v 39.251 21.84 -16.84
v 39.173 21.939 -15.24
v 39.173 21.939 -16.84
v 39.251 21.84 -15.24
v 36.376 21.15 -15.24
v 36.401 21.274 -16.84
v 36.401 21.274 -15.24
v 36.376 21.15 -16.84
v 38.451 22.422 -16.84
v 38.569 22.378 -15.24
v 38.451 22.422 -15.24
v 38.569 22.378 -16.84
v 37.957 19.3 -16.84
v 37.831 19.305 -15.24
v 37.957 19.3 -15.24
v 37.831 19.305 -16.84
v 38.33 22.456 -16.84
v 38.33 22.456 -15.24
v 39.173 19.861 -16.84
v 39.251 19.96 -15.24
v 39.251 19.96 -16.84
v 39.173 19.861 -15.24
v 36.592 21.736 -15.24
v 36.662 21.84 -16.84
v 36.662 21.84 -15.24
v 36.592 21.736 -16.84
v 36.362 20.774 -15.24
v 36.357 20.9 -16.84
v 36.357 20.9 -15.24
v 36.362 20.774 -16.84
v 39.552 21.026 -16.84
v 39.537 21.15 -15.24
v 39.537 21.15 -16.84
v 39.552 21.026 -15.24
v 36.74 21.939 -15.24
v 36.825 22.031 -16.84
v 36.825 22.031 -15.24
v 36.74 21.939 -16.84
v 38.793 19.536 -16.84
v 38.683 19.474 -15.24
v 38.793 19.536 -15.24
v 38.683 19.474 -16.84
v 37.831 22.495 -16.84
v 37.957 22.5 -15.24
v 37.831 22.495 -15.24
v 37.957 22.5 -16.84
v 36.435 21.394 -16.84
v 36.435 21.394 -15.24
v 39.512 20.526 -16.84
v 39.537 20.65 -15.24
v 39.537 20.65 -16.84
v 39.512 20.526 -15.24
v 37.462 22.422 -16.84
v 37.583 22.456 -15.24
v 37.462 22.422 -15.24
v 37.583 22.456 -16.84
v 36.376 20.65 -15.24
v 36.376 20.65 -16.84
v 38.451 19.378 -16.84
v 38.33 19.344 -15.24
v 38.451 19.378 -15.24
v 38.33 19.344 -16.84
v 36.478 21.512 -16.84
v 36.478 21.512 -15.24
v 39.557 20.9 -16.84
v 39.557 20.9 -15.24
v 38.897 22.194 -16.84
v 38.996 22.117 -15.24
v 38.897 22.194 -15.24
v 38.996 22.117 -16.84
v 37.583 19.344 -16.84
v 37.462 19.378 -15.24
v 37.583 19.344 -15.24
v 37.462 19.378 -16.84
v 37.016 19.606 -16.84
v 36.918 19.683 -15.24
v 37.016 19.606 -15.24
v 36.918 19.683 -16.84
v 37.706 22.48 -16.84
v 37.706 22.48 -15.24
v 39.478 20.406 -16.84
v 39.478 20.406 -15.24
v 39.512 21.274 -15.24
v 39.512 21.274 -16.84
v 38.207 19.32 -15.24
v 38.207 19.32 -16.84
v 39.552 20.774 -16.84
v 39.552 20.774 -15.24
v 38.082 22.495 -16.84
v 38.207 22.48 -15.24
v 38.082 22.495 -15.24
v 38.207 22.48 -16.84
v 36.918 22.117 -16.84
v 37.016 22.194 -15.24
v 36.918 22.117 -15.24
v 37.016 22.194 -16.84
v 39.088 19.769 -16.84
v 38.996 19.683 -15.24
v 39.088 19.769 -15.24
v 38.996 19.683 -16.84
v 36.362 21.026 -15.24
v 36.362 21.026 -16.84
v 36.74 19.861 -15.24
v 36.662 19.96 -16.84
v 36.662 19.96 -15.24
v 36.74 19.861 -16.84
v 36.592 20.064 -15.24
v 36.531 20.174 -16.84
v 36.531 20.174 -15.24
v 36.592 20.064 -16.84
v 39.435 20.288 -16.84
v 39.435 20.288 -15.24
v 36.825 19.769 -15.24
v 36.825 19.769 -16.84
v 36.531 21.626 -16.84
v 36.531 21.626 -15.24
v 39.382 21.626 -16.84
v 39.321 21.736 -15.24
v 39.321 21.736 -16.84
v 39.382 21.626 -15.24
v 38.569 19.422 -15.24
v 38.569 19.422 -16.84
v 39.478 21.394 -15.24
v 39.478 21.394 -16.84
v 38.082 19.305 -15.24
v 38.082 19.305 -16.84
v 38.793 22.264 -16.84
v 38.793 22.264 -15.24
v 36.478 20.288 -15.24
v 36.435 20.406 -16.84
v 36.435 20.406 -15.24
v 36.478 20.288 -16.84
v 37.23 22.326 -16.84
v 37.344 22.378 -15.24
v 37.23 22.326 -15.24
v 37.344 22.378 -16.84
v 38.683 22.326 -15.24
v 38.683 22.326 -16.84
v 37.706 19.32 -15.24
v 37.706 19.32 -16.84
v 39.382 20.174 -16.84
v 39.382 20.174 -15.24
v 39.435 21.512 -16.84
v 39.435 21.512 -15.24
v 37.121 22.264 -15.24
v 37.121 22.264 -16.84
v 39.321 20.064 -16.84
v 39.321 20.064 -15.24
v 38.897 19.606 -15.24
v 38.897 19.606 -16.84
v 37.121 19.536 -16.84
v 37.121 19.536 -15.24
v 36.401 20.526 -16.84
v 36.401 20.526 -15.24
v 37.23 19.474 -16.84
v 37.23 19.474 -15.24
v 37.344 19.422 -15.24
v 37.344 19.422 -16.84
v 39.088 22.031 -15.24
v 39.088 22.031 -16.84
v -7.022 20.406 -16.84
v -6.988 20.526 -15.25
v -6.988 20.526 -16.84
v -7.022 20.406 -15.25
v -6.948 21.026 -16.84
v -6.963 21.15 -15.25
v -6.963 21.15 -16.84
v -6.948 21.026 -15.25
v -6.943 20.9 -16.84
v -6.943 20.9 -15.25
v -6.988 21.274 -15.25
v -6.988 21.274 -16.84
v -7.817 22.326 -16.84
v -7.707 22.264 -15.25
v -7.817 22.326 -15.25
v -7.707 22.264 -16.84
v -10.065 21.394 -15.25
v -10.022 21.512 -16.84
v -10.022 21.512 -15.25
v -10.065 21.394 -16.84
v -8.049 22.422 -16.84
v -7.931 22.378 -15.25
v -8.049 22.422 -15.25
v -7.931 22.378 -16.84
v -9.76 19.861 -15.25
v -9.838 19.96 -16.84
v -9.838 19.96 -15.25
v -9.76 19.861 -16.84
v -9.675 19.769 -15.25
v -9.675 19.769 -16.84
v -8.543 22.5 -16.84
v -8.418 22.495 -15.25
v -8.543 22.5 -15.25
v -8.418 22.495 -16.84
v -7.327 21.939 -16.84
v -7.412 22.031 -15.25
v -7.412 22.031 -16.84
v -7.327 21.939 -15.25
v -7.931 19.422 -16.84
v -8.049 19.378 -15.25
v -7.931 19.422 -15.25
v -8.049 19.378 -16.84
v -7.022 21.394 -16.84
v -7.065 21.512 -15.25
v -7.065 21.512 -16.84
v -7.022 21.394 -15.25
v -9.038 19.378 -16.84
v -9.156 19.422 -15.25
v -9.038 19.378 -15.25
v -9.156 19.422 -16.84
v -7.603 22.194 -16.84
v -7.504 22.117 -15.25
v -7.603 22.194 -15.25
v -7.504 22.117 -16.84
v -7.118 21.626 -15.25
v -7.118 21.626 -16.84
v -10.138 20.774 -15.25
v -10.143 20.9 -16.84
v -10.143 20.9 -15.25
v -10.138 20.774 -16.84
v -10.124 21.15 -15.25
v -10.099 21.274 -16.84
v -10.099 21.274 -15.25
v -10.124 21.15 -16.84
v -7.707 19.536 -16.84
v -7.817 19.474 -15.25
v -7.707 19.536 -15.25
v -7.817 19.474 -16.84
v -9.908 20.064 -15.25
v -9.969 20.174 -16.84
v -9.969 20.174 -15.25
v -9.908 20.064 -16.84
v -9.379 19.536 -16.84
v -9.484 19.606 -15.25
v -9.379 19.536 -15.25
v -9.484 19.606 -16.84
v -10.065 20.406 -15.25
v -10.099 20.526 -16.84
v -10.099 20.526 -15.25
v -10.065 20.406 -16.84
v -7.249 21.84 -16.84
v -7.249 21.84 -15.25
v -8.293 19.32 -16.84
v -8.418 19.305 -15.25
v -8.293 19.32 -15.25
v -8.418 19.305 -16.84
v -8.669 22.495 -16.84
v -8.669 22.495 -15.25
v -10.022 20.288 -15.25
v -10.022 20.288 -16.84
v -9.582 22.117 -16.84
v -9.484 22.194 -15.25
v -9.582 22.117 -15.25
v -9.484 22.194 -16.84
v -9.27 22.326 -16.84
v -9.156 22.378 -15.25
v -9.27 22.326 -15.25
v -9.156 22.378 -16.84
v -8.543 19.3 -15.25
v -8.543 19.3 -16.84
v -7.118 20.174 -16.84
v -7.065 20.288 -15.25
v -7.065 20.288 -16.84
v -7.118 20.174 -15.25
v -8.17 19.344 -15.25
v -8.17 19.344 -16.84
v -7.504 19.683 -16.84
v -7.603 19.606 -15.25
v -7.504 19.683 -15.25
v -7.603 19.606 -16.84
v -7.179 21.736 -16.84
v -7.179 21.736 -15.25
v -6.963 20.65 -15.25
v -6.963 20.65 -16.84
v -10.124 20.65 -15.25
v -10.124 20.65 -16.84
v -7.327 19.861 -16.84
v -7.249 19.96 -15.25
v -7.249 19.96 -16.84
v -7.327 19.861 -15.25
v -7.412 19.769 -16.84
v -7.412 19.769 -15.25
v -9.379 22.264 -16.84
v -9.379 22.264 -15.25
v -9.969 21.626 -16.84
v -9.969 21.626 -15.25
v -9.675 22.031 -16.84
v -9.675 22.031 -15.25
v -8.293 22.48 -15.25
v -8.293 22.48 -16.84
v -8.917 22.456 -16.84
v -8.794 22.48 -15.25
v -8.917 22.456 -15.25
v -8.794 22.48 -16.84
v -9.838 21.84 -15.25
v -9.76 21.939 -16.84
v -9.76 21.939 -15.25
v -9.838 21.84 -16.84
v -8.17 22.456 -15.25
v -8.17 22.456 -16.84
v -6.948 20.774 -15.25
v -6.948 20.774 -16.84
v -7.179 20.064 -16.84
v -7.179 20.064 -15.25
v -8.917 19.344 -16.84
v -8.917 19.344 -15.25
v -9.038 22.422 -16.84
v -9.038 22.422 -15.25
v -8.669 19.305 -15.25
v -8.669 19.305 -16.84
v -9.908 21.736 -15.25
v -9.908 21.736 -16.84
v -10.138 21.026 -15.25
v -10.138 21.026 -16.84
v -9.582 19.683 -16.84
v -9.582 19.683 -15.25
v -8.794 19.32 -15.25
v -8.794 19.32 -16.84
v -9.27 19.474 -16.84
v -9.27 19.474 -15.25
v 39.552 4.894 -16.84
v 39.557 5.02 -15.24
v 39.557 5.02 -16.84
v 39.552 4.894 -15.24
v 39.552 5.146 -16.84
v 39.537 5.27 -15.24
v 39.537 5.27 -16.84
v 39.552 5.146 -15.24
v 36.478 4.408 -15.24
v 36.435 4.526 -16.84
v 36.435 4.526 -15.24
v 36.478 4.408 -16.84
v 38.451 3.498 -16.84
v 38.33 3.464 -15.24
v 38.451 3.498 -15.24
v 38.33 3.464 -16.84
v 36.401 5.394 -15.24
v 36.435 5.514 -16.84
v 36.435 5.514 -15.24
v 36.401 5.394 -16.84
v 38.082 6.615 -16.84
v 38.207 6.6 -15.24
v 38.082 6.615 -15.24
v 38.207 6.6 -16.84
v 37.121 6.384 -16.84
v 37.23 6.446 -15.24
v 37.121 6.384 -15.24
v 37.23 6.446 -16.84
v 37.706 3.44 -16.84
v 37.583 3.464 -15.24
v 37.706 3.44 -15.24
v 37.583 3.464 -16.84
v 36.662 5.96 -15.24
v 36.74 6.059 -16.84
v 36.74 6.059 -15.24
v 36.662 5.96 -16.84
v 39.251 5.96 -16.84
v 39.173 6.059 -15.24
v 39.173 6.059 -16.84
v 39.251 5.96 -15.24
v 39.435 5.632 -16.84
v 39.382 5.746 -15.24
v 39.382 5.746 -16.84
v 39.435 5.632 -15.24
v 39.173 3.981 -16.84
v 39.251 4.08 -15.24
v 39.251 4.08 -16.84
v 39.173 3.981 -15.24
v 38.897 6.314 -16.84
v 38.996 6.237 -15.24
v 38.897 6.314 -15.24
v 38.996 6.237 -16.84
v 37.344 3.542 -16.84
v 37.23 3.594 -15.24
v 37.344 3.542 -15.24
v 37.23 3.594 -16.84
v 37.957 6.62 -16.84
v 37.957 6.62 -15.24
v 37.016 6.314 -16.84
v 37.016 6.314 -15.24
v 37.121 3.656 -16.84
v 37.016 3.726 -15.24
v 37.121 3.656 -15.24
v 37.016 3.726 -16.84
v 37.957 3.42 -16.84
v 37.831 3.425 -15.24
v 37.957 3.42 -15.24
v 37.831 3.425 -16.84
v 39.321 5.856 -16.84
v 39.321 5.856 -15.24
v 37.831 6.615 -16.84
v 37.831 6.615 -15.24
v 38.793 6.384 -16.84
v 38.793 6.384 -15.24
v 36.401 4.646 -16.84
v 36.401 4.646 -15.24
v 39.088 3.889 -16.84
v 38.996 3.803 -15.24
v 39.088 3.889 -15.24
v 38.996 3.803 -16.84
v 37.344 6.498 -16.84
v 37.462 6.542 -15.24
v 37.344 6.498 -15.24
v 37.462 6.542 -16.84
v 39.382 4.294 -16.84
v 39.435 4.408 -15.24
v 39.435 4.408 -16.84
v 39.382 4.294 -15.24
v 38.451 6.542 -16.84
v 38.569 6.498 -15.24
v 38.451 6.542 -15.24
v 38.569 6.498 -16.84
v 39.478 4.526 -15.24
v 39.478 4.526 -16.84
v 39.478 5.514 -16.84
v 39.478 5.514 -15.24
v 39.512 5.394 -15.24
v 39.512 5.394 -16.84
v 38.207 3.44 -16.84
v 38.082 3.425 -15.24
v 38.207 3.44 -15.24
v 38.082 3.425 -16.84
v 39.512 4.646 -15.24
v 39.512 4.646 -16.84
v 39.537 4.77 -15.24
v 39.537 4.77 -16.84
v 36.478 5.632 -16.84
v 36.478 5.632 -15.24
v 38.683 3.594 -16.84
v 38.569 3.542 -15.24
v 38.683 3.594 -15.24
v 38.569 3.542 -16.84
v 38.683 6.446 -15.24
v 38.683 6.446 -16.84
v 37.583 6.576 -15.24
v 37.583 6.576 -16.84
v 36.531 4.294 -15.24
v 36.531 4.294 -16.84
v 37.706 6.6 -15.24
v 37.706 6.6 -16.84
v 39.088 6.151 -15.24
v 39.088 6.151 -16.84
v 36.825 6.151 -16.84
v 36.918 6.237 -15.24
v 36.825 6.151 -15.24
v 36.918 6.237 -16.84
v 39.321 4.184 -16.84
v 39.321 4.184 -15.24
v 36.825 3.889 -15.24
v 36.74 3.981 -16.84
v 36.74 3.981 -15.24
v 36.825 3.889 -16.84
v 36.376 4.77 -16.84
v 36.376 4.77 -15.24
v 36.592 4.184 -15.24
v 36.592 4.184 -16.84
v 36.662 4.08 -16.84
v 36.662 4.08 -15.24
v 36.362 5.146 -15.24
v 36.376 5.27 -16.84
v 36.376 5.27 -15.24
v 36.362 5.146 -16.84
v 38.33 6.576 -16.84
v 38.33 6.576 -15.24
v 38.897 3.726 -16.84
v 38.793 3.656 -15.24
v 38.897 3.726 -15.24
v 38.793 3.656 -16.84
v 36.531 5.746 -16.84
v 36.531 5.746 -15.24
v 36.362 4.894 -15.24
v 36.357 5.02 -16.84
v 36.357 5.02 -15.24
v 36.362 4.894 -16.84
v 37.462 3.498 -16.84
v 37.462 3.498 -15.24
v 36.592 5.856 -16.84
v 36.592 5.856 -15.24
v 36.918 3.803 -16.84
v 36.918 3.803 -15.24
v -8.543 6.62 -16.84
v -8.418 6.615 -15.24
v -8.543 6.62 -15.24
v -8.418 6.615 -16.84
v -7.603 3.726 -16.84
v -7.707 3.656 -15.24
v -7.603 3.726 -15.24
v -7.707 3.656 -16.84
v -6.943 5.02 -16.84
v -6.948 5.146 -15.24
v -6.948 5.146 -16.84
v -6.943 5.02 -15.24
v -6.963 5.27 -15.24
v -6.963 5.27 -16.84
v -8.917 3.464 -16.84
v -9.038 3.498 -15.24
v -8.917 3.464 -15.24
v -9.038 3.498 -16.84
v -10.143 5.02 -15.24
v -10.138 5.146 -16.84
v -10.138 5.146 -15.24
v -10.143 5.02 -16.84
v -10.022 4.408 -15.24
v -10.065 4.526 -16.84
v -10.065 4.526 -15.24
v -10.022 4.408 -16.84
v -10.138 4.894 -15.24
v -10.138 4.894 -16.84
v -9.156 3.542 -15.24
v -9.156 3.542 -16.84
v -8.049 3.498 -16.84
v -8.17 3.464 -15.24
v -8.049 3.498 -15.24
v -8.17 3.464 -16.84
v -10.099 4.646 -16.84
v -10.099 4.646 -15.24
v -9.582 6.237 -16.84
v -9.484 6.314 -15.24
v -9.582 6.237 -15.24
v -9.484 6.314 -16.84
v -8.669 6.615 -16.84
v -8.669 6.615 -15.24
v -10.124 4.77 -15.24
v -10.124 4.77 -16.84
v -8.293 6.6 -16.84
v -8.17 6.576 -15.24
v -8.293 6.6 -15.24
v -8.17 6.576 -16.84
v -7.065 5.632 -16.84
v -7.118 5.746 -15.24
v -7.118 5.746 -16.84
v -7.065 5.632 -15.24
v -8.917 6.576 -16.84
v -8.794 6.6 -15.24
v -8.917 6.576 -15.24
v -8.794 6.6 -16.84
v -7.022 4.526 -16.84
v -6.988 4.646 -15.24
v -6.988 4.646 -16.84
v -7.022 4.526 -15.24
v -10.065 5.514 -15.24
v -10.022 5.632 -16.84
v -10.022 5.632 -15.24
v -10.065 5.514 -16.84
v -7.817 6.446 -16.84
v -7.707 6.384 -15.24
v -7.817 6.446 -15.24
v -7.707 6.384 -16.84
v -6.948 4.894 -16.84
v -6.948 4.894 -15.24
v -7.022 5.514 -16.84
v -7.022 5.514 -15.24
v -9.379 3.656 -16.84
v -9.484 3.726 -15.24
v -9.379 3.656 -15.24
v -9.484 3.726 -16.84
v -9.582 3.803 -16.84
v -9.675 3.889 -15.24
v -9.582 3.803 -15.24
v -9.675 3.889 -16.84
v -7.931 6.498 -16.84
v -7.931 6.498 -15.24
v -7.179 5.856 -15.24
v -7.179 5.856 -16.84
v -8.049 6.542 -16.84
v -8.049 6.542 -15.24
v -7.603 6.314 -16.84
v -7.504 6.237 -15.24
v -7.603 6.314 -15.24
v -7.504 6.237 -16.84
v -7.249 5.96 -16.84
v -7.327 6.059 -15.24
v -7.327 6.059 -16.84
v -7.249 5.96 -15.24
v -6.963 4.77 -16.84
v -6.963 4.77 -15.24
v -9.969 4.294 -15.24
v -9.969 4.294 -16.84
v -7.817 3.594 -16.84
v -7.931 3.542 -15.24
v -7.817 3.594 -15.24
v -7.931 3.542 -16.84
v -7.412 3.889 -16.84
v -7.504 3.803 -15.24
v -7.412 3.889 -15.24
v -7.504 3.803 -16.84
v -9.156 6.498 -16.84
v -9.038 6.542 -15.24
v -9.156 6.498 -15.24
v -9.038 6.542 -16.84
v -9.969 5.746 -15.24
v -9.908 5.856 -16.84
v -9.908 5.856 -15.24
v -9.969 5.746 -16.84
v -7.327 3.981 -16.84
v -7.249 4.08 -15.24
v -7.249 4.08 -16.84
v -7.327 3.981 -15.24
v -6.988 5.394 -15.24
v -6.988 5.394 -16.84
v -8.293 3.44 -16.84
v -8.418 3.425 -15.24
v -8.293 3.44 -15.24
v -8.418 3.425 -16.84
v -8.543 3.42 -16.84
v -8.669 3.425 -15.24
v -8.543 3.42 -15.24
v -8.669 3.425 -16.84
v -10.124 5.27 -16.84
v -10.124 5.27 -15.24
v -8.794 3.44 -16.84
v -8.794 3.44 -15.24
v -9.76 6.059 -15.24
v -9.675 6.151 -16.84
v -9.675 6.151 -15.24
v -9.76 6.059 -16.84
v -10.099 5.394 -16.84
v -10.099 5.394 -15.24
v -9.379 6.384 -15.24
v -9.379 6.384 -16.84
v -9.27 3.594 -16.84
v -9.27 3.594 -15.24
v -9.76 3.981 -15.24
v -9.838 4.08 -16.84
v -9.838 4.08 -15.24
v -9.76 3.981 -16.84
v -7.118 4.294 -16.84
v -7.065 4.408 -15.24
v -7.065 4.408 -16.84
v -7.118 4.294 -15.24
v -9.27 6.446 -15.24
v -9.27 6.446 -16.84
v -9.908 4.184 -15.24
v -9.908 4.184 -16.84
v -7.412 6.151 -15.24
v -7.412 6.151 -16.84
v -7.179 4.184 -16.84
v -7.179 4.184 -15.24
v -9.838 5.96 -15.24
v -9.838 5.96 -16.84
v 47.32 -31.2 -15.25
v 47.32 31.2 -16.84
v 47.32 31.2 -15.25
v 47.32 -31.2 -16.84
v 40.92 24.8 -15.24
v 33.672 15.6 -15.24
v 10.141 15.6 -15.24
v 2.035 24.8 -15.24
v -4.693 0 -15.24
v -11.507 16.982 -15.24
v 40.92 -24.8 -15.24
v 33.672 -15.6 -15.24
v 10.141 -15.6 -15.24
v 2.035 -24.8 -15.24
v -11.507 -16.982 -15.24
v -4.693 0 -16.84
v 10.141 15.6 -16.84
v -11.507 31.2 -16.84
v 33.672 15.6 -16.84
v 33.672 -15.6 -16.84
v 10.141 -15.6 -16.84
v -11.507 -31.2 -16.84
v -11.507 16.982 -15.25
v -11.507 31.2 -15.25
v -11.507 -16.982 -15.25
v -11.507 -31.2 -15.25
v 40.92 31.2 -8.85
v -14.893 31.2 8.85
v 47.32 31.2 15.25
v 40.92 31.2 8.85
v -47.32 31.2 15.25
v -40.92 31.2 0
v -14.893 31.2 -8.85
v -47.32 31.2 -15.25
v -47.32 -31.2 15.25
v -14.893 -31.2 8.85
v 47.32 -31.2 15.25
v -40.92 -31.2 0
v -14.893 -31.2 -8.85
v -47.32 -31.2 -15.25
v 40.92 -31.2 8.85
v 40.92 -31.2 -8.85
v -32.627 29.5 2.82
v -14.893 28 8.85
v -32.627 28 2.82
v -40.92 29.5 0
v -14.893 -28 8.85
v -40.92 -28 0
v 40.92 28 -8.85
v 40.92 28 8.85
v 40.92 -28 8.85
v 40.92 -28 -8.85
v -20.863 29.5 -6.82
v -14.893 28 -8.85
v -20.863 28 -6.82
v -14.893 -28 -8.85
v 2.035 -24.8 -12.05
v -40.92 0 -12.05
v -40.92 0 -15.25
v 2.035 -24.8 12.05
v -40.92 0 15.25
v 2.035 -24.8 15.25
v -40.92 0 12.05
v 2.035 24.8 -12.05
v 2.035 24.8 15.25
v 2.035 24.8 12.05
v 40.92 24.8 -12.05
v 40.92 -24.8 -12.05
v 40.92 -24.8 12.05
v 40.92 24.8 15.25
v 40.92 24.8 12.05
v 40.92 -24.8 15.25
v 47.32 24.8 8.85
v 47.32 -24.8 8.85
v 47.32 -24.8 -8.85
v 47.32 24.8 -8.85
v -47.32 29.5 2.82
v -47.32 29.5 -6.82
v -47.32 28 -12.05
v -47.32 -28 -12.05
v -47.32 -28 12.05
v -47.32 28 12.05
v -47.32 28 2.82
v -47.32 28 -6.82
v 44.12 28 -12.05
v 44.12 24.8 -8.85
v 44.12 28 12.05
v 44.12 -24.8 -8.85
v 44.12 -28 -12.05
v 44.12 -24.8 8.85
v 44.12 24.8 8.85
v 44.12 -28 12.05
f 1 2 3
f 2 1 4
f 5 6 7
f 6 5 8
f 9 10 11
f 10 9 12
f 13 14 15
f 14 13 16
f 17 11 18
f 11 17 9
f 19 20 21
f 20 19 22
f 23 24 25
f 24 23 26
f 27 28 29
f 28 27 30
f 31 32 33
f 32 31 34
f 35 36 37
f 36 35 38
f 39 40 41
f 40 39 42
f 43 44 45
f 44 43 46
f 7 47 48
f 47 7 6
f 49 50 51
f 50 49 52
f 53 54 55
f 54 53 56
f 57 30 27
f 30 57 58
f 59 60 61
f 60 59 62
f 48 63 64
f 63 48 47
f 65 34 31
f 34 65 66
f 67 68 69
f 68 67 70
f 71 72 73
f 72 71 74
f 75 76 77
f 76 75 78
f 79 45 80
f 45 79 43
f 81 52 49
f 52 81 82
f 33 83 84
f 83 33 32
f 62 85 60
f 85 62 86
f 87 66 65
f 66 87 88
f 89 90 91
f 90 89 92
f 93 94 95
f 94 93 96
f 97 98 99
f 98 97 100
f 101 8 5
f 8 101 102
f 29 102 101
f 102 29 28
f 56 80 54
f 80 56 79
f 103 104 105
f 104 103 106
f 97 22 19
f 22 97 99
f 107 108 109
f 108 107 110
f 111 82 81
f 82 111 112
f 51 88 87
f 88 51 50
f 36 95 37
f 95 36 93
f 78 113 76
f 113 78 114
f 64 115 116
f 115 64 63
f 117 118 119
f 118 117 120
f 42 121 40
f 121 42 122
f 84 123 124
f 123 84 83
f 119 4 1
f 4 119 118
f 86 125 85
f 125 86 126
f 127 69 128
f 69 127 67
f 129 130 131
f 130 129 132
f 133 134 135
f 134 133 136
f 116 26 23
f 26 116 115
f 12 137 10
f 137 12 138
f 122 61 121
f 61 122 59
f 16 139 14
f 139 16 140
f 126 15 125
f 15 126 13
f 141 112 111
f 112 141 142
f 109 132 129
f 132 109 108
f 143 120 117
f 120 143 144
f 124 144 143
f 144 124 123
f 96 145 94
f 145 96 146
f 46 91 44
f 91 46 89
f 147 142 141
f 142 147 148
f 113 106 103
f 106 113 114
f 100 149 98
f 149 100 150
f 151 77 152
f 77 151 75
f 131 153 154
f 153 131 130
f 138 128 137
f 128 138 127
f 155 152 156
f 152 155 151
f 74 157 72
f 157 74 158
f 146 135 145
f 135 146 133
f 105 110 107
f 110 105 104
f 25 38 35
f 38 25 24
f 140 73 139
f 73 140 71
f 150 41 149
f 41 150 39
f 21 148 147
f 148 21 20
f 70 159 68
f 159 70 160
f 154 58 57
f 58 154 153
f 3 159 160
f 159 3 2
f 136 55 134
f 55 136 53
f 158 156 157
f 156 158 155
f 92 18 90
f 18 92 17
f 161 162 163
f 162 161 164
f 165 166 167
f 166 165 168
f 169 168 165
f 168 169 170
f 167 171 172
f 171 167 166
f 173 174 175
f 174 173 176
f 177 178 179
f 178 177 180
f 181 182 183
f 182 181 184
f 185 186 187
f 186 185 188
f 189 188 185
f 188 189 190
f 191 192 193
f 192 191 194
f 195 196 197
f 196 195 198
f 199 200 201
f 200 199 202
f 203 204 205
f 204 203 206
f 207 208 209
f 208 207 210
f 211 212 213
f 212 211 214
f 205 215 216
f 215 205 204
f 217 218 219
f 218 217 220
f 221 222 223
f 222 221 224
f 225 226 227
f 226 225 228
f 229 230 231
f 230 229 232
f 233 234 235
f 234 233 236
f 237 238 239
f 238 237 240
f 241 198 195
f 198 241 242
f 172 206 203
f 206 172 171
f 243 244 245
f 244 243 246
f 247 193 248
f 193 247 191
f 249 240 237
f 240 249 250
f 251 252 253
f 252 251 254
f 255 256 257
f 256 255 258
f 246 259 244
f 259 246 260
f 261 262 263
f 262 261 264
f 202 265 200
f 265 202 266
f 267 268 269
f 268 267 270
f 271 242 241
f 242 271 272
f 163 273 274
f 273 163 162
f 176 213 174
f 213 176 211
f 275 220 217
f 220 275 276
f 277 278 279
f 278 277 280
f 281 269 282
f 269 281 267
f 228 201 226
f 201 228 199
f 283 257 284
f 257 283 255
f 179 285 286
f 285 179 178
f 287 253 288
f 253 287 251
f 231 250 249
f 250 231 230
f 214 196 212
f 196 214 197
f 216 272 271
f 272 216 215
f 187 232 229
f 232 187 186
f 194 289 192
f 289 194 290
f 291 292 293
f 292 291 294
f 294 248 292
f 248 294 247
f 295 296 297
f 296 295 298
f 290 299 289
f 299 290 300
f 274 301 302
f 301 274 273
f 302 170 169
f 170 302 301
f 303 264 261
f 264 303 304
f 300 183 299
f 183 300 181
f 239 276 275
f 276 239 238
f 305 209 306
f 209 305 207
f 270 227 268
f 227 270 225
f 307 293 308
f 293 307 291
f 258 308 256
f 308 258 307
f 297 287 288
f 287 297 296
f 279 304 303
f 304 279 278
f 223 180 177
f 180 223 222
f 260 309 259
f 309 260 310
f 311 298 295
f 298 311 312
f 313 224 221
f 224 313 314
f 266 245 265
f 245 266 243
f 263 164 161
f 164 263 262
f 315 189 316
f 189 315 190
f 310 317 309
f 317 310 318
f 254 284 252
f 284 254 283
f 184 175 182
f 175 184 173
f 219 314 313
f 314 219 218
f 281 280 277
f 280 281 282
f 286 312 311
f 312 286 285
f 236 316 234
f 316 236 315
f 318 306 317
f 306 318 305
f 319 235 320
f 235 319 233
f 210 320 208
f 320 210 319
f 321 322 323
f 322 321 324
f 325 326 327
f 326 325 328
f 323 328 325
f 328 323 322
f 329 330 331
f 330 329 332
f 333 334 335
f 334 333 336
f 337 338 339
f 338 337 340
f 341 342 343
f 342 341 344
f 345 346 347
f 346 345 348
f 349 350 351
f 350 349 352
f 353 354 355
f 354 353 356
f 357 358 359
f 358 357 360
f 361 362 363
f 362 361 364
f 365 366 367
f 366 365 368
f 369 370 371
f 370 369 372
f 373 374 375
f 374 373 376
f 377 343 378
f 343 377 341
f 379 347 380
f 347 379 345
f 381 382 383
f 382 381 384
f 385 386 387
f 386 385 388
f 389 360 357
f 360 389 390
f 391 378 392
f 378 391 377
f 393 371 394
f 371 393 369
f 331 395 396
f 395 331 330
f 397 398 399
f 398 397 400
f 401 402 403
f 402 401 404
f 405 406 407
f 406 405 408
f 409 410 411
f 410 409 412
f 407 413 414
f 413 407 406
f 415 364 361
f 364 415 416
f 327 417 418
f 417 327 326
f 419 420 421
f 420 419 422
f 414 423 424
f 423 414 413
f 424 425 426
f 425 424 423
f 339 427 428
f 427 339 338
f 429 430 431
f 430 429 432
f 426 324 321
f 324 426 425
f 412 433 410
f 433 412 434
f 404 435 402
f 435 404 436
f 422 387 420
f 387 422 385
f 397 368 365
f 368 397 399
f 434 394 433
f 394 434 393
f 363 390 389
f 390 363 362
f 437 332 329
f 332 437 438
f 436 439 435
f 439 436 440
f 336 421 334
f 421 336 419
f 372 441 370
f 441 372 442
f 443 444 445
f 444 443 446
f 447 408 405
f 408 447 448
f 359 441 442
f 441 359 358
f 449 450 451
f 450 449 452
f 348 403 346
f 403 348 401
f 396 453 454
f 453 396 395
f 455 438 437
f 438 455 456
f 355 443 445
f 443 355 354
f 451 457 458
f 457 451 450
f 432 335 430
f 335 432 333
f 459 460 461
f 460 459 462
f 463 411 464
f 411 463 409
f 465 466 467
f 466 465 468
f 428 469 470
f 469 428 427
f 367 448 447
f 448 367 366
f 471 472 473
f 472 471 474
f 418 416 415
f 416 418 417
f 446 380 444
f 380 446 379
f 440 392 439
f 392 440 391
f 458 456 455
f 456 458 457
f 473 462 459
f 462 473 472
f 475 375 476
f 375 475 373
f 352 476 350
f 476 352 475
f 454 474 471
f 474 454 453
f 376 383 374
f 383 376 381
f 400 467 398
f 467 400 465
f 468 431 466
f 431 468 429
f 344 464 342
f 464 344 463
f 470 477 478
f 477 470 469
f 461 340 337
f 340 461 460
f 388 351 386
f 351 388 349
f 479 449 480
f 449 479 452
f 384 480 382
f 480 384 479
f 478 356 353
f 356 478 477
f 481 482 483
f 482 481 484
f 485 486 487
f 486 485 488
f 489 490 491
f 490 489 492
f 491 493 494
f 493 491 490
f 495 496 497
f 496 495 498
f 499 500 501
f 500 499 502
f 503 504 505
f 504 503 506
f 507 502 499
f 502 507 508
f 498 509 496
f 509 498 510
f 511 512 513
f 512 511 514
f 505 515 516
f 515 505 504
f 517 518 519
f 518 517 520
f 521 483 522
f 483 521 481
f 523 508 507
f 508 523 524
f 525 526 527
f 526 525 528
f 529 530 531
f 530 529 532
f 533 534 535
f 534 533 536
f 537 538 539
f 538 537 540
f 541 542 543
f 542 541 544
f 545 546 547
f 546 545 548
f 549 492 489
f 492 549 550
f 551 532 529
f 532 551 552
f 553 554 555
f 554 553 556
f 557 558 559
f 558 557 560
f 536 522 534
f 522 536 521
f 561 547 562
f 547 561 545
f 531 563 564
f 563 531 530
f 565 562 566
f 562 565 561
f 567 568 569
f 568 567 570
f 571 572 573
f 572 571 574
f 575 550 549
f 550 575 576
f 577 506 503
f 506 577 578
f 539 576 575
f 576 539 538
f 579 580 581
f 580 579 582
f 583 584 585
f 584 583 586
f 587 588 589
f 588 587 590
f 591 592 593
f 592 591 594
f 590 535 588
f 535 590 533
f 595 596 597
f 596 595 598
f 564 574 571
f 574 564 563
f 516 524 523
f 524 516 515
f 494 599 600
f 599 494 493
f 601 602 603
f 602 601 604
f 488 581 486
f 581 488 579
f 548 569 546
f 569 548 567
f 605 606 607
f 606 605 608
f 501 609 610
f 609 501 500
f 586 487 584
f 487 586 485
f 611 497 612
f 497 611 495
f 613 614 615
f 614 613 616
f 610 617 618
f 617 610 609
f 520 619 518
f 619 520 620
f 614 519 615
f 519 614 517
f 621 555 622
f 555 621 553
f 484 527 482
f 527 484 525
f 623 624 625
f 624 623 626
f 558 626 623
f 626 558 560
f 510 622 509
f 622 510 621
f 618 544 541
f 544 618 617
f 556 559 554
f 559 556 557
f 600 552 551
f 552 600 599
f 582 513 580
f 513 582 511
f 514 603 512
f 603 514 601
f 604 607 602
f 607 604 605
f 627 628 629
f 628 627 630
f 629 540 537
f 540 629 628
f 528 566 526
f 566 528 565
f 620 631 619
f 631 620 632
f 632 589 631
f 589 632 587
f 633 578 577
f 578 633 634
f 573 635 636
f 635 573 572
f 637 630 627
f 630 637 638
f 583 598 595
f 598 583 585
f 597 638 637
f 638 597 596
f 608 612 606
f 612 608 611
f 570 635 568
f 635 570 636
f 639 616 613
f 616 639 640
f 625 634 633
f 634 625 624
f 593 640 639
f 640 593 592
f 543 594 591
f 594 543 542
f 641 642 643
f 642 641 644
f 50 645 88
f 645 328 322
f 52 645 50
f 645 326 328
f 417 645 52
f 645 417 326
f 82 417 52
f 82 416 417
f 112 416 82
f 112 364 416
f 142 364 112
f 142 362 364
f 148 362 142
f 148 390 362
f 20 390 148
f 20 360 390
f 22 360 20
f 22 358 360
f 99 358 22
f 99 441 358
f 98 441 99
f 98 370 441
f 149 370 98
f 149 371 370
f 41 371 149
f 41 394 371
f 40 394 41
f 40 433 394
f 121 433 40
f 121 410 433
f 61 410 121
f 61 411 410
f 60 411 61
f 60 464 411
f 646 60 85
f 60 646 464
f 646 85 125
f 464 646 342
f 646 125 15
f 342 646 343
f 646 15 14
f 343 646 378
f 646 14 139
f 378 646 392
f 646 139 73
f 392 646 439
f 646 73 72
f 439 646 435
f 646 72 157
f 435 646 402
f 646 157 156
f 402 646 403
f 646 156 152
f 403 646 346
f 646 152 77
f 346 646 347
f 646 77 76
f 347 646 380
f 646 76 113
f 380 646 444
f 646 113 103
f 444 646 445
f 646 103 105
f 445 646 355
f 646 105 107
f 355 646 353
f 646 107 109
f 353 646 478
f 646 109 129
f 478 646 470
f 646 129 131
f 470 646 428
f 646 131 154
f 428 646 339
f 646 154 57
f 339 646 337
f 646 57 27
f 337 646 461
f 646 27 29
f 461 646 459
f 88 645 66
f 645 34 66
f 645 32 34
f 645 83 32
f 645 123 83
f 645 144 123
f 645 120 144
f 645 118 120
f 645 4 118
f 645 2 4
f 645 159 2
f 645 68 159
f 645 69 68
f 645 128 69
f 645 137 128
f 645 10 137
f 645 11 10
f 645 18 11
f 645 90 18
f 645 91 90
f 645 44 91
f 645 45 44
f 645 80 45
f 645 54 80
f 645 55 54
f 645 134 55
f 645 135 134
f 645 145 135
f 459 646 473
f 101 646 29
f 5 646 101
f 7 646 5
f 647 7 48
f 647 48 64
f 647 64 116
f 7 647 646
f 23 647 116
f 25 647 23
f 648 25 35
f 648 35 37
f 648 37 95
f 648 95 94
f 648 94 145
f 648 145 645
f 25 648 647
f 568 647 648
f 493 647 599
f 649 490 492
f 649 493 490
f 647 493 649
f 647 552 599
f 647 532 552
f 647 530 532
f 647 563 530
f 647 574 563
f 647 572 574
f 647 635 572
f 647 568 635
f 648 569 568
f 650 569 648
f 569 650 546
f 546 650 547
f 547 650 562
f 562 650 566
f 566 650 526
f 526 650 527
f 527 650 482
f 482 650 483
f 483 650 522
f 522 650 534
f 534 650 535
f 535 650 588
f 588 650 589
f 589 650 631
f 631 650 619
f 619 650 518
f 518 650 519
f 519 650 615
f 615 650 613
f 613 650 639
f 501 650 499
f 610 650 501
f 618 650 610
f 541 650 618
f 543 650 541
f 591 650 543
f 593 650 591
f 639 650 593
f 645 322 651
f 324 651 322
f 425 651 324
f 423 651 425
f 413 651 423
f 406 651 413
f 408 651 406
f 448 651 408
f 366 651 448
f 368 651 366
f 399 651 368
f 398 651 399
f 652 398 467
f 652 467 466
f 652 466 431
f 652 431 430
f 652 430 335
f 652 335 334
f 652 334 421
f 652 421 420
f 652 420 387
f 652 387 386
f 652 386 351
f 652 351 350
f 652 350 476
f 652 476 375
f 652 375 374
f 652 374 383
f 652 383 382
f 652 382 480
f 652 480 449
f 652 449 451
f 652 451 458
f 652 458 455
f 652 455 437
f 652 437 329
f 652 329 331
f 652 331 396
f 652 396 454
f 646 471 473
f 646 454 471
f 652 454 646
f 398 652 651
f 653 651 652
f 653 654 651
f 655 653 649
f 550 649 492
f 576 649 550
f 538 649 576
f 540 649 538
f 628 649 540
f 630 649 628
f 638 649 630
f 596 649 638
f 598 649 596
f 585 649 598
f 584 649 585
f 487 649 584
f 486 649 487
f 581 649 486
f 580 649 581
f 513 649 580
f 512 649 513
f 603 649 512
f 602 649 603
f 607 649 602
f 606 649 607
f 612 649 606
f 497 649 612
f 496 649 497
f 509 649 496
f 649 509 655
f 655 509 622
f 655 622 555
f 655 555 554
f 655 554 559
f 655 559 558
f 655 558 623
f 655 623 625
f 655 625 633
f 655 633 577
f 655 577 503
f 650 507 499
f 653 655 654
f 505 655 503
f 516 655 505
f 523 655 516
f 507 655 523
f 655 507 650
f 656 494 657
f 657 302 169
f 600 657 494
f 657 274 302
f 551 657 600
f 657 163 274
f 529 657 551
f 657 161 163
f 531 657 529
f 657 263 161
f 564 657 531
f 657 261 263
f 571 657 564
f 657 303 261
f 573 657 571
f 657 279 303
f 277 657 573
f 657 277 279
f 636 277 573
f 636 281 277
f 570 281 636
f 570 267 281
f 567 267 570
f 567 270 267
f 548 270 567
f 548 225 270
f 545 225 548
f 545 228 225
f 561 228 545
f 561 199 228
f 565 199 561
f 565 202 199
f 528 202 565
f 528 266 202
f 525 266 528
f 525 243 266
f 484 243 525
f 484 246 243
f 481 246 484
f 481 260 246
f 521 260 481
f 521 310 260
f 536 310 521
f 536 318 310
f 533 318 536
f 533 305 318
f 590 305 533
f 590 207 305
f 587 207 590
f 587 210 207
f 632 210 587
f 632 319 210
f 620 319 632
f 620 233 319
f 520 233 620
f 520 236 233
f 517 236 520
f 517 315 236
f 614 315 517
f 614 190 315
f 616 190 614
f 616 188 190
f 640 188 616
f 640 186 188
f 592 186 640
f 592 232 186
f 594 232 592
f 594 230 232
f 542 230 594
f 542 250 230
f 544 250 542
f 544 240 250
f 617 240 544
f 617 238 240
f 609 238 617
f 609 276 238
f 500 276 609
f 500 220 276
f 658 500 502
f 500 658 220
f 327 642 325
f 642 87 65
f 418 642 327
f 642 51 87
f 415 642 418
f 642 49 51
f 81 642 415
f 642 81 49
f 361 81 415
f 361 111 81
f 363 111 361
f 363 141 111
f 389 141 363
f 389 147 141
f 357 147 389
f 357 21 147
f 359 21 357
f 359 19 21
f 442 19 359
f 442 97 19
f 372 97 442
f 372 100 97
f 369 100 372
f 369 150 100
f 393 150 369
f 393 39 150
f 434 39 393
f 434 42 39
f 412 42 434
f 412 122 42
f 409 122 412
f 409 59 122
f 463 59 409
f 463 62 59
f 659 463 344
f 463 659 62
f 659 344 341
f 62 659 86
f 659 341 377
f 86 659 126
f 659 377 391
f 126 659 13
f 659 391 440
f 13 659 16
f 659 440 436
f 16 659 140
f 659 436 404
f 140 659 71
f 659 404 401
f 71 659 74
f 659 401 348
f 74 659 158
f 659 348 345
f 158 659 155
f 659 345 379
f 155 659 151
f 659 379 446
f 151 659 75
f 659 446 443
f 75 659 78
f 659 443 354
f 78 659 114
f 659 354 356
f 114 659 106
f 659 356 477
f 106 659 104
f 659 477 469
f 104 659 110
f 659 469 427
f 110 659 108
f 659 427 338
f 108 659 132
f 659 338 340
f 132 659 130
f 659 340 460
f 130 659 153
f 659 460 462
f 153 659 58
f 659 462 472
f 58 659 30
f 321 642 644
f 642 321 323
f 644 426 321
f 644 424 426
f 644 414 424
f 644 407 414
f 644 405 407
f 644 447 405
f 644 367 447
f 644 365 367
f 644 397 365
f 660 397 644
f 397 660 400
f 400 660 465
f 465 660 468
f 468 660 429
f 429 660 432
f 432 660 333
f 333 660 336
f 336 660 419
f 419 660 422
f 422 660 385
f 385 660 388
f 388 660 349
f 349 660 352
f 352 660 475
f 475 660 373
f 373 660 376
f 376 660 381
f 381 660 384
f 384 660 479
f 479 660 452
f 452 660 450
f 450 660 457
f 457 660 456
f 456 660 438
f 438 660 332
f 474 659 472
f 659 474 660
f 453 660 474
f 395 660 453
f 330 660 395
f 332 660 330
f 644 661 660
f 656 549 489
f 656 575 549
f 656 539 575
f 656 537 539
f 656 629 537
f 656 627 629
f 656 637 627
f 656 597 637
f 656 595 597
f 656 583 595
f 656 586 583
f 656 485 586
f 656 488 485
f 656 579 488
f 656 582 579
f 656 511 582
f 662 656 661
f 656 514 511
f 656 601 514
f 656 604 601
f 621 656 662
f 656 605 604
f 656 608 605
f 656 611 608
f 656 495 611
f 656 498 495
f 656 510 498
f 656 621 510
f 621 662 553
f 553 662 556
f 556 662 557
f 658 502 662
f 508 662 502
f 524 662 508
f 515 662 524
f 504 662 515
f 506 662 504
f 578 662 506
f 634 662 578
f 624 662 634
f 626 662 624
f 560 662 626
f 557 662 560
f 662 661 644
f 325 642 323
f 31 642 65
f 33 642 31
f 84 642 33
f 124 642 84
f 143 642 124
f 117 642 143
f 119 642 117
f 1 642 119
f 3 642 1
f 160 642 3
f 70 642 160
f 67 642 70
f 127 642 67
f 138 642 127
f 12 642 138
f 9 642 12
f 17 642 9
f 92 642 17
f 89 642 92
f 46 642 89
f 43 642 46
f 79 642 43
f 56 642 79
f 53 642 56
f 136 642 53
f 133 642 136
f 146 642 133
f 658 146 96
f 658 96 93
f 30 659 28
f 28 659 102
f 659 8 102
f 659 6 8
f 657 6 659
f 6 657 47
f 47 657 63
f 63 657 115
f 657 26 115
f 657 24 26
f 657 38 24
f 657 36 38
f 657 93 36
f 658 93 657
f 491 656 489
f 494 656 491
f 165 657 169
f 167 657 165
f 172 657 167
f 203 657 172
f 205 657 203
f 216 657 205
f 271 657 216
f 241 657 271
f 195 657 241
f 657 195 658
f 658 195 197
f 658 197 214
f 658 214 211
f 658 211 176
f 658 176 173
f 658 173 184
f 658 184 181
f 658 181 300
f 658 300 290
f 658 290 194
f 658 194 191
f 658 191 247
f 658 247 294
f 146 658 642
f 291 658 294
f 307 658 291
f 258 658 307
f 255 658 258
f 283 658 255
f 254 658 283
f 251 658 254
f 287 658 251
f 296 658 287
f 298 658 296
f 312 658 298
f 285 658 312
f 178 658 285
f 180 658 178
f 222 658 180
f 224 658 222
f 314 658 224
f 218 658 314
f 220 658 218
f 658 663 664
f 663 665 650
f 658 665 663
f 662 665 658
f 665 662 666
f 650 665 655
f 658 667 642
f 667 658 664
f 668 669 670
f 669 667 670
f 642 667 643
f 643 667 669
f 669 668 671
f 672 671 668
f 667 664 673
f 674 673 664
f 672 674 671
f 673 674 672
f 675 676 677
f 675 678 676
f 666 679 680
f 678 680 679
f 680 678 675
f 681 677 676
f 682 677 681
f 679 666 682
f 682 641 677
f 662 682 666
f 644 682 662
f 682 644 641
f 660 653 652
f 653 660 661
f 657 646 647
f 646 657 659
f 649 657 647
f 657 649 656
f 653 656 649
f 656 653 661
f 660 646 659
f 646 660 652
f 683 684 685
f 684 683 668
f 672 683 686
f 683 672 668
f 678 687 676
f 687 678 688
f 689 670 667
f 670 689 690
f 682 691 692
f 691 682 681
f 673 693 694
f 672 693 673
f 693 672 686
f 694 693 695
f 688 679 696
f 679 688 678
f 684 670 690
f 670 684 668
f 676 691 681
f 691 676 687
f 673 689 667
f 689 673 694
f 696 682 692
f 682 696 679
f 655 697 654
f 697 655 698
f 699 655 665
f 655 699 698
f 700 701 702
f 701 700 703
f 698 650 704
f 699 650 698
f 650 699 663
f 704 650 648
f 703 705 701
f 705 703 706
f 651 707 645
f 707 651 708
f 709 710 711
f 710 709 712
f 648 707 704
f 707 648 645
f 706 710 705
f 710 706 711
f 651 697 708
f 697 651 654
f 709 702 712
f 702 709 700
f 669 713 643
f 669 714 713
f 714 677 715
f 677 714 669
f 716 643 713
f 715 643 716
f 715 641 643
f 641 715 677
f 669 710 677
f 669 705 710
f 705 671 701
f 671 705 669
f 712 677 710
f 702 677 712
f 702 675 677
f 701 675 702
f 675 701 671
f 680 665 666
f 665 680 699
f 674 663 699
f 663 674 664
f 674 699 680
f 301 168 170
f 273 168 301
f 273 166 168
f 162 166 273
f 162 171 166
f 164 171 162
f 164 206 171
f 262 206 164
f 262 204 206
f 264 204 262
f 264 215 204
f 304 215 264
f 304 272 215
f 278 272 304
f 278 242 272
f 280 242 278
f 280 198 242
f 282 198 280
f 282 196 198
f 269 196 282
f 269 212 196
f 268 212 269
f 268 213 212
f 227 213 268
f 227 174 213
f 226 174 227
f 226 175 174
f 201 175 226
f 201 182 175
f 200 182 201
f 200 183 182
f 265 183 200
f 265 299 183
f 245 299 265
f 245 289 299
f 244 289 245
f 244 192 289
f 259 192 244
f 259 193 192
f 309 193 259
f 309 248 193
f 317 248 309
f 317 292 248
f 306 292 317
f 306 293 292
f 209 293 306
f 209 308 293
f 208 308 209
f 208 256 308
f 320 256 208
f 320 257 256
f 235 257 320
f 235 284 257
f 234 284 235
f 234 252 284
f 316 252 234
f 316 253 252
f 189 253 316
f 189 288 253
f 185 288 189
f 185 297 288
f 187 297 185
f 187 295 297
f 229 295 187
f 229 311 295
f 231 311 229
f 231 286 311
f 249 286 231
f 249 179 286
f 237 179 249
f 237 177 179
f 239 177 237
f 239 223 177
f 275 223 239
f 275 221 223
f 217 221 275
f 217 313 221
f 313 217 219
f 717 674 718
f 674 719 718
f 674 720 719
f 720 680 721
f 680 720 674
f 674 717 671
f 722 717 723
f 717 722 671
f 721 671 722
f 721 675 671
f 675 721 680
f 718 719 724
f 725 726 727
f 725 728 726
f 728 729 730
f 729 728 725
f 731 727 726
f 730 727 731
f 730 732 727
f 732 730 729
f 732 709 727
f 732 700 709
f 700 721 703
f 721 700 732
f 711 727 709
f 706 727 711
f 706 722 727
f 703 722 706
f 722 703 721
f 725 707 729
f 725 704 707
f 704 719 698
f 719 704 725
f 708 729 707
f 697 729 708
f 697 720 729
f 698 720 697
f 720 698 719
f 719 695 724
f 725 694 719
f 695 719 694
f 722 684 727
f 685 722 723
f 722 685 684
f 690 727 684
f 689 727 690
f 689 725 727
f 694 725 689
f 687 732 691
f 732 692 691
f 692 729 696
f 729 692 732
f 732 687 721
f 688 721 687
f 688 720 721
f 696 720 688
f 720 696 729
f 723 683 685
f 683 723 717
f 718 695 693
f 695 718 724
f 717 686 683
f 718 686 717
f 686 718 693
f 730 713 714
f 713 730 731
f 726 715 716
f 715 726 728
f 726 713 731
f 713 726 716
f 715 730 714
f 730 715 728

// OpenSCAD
$fn=80;
epsilon = 0.01;
// dimensions of Raspberry Pi 4 w/ Armor case
rpi_h = 24.1;
rpi_w = 56;
rpi_l = 88.24;

bottom_armor_h = 4.6;
top_armor_display_port_pocket_h = 16.25;
top_armor_display_port_pocket_w = 22.4;
top_armor_display_port_pocket_l = 3.5;

wt = 3.2;

union() {
  color("green")
  base_plate();
  main_frame();
}

module base_plate() {
  plate_l = rpi_l/1.5;
  plate_w = rpi_w + 2*wt;
  plate_off_x = (rpi_l - plate_l)/2 + wt;

  // 4 screw holes
  screw_dist_x = 21.14 - 5.26;
  screw_dist_y = 46.5;

  screw_off_x = 10.3;
  screw_off_y = 22;

  screw_d = 3.2;

  translate([plate_off_x, 0, -rpi_h/2 - 1.25*wt + epsilon])
  difference() {
    union() {
      cube([plate_l, plate_w, wt/2], center=true);
    }

    translate([-wt, plate_w/2 - screw_dist_x/2 - screw_off_x, -500])
    union() {
      translate([screw_dist_y/2, screw_dist_x/2, 0])
      cylinder(d=screw_d, h=1000);

      translate([-screw_dist_y/2, screw_dist_x/2, 0])
      cylinder(d=screw_d, h=1000);

      translate([screw_dist_y/2, -screw_dist_x/2, 0])
      cylinder(d=screw_d, h=1000);

      translate([-screw_dist_y/2, -screw_dist_x/2, 0])
      cylinder(d=screw_d, h=1000);
    }

    hull() {
      translate([-7,0,0])
      rotate([0,0,45])
      cube([plate_w/2 / sqrt(2), plate_w/2 / sqrt(2),20], center=true);

      translate([4,0,0])
      cube([plate_l/2.5,plate_w/2,20], center=true);
    }
  }
}

module main_frame() {
  difference() {
    union() {
      cube([rpi_l + 2*wt, rpi_w + 2*wt, rpi_h + 2*wt], center=true);
    }

    // cutout in direction of x-axis
    translate([-2*wt,0,0])
    cube([rpi_l + 4*wt, rpi_w, rpi_h], center=true);

    // slot for audio and usb ports
    translate([-3*wt, rpi_w/2, -2])
    cube([rpi_l + 4*wt, 3, rpi_h/2.5], center=true);

    cube([2*rpi_l, rpi_w - 2*wt, rpi_h - 2*wt], center=true);

    intersection() {
      h = 1;
      a = 2 * h / sqrt(3);
      ru = a/sqrt(3);
      ri = a/2/sqrt(3);
      scale([rpi_l - 2*wt, 2*rpi_w, 2*rpi_h])
      rotate([90,0,180])
      translate([ri - h/2, 0, 0])
      cylinder($fn=3, r=ru, h=1, center=true);

      cube([rpi_l - 2*wt, 2*rpi_w, rpi_h - 2*wt], center=true);
    }

    intersection() {
      h = rpi_l - 2*wt;
      a = 2 * h / sqrt(3);
      ru = a/sqrt(3);
      ri = a/2/sqrt(3);
      rotate([0,0,180])
      translate([ri - h/2, 0, 0])
      cylinder($fn=3, r=ru, h=2*rpi_h, center=true);

      cube([rpi_l - 2*wt, rpi_w - 2*wt, 2*rpi_h], center=true);
    }
  }
}
